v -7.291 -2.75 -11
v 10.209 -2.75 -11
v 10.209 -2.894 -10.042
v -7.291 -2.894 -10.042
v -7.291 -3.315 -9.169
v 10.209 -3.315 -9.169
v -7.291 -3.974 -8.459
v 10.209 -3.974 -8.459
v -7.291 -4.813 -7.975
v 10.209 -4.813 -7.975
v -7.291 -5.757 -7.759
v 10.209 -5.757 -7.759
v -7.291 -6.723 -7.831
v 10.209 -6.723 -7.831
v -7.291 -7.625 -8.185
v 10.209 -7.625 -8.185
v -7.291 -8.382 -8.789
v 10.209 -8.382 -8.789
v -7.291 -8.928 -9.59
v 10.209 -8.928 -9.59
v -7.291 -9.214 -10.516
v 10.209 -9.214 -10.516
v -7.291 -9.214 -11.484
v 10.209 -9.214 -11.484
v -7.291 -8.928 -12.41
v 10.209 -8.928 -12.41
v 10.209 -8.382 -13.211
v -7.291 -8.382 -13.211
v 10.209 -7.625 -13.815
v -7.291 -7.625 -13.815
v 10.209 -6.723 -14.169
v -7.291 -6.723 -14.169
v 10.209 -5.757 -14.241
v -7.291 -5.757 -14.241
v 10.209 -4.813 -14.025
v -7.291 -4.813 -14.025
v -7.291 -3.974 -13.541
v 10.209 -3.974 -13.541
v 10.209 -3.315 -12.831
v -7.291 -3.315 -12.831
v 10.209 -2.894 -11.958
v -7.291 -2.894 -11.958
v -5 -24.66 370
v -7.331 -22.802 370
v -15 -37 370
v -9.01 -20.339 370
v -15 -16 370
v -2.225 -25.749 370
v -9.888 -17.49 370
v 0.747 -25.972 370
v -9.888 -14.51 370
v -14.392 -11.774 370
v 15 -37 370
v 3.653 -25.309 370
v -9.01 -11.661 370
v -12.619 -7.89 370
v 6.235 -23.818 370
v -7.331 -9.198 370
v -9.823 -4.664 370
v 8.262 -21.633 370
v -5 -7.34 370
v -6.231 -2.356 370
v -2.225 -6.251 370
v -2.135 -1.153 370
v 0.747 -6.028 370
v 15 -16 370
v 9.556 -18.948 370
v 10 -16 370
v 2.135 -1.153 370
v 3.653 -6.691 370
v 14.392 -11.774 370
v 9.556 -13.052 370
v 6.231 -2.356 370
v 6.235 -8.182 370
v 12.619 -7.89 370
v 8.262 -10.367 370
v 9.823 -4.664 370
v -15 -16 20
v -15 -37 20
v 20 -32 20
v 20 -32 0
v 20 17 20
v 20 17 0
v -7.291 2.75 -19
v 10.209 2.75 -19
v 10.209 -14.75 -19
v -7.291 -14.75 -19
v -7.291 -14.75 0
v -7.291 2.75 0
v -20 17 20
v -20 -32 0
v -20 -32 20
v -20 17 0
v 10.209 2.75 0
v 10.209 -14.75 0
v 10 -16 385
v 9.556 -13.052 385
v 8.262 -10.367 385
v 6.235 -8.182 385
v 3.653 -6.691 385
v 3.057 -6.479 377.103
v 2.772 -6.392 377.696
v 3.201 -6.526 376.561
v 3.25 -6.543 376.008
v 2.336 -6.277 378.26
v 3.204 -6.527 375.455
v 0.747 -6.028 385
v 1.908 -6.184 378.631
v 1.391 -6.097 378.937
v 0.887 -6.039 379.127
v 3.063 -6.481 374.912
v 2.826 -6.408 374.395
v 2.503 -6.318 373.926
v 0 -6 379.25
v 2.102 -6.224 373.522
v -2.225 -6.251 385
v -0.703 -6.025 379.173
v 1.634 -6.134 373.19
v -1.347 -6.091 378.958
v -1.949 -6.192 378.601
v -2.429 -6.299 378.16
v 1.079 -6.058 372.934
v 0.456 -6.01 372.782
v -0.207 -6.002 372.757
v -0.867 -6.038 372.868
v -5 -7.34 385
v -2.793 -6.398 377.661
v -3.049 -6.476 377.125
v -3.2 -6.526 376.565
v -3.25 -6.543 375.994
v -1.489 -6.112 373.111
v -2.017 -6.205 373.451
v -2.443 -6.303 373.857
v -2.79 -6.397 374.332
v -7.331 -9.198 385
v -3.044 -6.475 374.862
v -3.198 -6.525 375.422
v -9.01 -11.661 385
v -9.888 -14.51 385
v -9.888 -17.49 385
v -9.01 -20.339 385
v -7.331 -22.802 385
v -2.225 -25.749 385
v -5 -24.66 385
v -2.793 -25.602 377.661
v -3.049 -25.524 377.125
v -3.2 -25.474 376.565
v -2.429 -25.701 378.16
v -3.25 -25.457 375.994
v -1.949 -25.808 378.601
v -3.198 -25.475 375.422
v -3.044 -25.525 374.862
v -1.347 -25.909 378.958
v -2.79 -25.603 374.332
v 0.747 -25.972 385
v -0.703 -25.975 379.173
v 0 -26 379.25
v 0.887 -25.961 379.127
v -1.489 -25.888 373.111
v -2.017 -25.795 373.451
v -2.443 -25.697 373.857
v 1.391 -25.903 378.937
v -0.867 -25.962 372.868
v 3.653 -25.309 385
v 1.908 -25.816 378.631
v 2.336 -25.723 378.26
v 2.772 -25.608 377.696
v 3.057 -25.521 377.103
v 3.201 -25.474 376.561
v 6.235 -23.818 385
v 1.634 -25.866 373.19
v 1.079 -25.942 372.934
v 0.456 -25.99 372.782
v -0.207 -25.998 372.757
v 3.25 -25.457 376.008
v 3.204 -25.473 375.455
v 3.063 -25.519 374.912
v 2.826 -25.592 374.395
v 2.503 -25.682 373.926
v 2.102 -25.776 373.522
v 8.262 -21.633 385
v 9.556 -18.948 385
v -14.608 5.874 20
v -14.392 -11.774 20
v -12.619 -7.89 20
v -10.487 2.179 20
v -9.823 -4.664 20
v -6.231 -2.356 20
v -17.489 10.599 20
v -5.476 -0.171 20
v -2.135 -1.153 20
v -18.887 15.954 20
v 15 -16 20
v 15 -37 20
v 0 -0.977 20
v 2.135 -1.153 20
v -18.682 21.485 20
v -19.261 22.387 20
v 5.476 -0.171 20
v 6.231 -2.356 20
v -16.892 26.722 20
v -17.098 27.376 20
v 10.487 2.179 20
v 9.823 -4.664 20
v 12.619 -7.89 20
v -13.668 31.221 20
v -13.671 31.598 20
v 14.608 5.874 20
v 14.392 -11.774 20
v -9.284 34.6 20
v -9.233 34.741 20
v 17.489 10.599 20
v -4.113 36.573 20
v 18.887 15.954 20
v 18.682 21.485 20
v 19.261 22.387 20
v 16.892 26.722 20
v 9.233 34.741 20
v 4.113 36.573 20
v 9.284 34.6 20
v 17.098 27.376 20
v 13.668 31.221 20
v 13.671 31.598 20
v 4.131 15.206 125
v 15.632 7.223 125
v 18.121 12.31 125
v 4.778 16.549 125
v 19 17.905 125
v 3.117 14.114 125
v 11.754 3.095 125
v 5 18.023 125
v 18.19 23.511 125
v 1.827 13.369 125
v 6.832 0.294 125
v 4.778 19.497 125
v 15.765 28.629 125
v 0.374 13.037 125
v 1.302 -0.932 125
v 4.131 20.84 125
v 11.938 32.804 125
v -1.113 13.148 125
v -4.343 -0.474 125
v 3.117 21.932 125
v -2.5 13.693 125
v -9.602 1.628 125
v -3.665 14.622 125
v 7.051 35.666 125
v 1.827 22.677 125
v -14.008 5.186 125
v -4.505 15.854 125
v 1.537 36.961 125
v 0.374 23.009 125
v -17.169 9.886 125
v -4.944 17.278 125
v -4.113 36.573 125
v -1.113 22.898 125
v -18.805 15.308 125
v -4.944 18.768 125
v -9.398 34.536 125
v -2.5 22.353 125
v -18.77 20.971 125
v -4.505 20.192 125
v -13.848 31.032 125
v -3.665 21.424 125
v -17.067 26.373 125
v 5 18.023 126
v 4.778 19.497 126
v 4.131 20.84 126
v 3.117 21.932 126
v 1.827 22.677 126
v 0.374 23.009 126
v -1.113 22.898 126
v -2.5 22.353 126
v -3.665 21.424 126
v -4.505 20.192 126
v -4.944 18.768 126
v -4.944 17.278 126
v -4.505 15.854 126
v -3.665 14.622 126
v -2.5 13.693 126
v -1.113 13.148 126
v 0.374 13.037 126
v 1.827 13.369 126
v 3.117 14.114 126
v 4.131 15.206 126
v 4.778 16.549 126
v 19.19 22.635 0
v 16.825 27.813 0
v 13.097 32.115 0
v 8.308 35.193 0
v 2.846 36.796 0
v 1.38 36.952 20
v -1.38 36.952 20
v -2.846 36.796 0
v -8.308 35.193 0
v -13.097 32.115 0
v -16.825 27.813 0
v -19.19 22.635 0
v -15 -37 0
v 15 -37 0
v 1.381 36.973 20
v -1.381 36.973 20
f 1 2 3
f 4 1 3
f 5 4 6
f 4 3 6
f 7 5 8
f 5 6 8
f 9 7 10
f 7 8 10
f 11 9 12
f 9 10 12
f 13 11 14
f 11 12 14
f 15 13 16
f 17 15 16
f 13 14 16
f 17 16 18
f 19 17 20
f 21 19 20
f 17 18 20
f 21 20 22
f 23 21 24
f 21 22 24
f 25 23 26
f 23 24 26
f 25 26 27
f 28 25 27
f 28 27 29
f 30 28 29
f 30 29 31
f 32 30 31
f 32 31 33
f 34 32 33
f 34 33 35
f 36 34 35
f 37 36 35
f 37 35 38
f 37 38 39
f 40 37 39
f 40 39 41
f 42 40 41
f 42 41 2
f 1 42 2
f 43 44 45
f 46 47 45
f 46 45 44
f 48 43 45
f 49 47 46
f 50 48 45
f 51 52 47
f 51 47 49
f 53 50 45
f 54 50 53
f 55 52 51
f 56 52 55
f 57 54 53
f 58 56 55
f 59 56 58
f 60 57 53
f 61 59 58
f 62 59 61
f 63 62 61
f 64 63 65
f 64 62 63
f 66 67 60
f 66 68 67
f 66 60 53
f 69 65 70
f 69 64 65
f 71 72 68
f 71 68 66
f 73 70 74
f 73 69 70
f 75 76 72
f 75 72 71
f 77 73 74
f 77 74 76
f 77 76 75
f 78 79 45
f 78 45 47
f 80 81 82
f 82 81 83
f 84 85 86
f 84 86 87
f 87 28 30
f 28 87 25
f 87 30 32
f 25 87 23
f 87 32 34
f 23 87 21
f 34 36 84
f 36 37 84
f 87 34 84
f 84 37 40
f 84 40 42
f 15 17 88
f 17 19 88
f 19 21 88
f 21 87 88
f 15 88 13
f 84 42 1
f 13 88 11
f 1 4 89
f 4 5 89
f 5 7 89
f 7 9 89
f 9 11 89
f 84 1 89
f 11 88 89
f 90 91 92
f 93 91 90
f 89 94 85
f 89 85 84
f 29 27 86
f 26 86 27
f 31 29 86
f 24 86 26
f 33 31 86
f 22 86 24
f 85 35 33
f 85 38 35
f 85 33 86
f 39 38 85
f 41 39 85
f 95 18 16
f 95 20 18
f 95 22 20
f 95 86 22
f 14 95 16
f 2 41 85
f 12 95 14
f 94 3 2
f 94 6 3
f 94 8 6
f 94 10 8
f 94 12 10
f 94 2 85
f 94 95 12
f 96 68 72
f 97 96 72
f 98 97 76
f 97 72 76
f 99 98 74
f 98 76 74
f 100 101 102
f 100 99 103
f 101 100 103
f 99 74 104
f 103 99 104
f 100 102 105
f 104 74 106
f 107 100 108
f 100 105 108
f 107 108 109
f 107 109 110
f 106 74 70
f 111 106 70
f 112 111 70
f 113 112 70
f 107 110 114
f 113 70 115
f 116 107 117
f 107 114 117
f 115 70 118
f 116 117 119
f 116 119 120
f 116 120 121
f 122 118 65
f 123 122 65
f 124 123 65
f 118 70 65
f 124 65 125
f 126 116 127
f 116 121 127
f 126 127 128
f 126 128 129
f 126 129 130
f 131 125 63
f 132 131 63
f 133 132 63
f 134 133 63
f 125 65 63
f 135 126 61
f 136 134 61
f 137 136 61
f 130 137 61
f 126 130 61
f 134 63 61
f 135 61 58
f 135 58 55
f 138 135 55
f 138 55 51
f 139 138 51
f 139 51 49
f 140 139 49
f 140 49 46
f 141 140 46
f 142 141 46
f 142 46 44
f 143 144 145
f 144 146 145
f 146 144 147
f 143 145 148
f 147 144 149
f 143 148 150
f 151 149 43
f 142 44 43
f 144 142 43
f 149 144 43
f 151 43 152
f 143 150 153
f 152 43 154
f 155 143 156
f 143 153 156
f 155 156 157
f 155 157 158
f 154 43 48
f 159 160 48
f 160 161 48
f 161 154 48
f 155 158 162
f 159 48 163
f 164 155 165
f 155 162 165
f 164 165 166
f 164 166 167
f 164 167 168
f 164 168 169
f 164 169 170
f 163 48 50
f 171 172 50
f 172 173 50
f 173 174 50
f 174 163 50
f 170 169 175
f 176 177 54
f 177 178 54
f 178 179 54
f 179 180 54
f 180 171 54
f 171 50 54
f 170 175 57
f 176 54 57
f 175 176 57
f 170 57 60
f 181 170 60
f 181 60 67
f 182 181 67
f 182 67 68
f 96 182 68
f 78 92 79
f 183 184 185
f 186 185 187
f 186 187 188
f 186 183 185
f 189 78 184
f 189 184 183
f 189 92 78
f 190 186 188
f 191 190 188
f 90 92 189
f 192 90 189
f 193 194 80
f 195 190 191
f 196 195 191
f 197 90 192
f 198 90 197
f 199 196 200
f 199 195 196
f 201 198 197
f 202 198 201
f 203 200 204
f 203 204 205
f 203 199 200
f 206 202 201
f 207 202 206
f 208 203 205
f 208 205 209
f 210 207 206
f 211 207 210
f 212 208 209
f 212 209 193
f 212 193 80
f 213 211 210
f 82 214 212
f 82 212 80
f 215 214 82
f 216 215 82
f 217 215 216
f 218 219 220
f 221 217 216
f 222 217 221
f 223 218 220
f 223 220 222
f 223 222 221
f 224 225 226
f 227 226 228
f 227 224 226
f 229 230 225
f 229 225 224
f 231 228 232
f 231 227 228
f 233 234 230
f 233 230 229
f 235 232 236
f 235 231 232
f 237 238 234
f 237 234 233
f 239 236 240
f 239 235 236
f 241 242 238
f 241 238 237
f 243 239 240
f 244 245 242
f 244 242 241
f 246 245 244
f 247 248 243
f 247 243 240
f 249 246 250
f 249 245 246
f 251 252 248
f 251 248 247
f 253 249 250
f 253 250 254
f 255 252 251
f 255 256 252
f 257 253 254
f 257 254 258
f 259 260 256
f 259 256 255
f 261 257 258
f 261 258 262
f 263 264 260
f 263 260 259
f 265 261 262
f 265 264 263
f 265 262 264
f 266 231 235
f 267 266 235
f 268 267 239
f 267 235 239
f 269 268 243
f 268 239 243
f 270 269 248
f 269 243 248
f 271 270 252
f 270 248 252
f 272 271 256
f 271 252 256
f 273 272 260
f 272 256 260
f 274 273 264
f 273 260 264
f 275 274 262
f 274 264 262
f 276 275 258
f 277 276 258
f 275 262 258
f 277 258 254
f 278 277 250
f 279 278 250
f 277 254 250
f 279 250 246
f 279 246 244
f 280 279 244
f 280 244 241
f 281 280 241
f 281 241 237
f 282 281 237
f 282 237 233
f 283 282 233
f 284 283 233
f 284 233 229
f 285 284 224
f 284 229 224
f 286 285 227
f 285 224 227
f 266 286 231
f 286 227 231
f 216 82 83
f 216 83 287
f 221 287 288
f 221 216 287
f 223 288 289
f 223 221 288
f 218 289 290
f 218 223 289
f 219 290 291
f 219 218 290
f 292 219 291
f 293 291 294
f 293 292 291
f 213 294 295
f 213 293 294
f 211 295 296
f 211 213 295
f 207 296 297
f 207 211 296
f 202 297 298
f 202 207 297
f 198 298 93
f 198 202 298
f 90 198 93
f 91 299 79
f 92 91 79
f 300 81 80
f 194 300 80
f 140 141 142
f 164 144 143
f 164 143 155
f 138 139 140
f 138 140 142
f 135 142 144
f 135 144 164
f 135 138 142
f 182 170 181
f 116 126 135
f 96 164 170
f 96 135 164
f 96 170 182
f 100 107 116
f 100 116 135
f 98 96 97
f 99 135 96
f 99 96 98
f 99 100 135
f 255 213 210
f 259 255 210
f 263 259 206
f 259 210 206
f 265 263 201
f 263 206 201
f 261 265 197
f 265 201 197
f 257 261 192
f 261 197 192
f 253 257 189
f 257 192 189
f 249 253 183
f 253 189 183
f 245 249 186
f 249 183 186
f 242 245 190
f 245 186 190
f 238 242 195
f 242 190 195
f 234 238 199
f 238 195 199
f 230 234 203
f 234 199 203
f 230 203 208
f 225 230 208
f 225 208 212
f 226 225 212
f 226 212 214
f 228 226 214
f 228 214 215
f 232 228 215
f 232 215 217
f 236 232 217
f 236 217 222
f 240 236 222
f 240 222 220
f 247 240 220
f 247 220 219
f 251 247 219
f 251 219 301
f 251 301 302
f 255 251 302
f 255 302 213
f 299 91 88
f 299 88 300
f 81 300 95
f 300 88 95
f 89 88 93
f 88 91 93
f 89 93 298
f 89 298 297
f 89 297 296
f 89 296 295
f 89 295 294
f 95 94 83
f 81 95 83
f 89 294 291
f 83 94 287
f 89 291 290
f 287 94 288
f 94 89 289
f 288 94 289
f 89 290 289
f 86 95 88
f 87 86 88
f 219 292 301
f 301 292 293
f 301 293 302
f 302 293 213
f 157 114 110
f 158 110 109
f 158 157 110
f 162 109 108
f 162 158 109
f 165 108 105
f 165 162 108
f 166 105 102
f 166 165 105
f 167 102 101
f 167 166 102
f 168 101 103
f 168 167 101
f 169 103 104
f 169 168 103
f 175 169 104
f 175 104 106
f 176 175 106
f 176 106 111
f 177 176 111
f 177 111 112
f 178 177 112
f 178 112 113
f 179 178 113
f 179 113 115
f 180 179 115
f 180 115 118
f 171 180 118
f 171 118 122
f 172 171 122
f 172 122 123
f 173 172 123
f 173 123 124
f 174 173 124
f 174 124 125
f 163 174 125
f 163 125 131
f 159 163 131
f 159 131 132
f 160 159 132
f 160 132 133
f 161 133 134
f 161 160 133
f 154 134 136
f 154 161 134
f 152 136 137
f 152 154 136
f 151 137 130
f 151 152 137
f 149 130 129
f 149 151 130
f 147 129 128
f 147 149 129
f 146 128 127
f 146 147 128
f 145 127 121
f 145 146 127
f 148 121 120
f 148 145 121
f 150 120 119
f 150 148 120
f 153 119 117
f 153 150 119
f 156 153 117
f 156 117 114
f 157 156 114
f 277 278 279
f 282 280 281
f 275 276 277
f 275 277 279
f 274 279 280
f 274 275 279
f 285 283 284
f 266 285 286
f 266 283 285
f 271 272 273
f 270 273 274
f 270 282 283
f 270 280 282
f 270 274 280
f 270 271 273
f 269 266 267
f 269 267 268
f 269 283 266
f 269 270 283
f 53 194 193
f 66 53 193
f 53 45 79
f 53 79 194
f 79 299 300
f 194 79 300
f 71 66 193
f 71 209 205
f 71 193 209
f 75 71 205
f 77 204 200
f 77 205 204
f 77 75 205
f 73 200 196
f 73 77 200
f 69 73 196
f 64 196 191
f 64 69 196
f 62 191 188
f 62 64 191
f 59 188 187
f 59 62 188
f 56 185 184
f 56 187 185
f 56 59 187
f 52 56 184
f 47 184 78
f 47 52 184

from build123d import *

# Parameters (mm, degrees)
SKETCH1_W               = 40
SKETCH1_H               = 74
BOSS_EXTRUDE1_DEPTH     = 20
FILLET1_RADIUS          = 20
FILLET1_LENGTH          = 20
CHAMFER1_SIZE           = 5
CHAMFER2_SIZE           = 5
SKETCH2_R               = 19
BOSS_EXTRUDE2_DEPTH     = 105
SKETCH3_R               = 5
BOSS_EXTRUDE3_DEPTH     = 1
SKETCH5_W               = 30
SKETCH5_H               = 36
BOSS_EXTRUDE4_DEPTH     = 350
FILLET2_RADIUS          = 15
FILLET2_LENGTH          = 350
SKETCH6_R               = 10
BOSS_EXTRUDE5_DEPTH     = 15
CUT_EXTRUDE1_DEPTH      = 391.476447911
CUT_EXTRUDE1_DEPTH_BACK = 391.476447911
SKETCH8_R               = 3.25
SKETCH9_W               = 17.5
SKETCH9_H               = 17.5
BOSS_EXTRUDE6_DEPTH     = 19
SKETCH11_R              = 3.25
CUT_EXTRUDE3_DEPTH      = 388.953947021


with BuildPart() as part:
    # Sketch1 → Boss-Extrude1 (new body)
    with BuildSketch(Plane.XY):
        Rectangle(SKETCH1_W, SKETCH1_H)
    extrude(amount=BOSS_EXTRUDE1_DEPTH)

    # Fillet1: full round fillet: the end face becomes a half cylinder, R = half its width
    fillet1_face = Plane((0, 37, 10), x_dir=(0, 0, 1), z_dir=(0, 1, 0))  # on the end face: x along it, z out of the body
    fillet1_slab = fillet1_face.offset(-FILLET1_RADIUS / 2) * Box(FILLET1_LENGTH, 2 * FILLET1_RADIUS, FILLET1_RADIUS, mode=Mode.PRIVATE)  # the body's end, R deep
    fillet1_round = Plane((0, 17, 10), x_dir=(0, 1, 0), z_dir=(0, 0, 1)) * Cylinder(FILLET1_RADIUS, FILLET1_LENGTH, mode=Mode.PRIVATE)  # its axis R under the face
    add(fillet1_slab - fillet1_round, mode=Mode.SUBTRACT)

    # Chamfer1
    chamfer1_edges = [part.edges().sort_by_distance(p)[0] for p in [
        (-20, -37, 10),
    ]]
    chamfer(chamfer1_edges, length=CHAMFER1_SIZE)

    # Chamfer2
    chamfer2_edges = [part.edges().sort_by_distance(p)[0] for p in [
        (20, -37, 10),
    ]]
    chamfer(chamfer2_edges, length=CHAMFER2_SIZE)

    # Sketch2 → Boss-Extrude2 (add)
    with BuildSketch(Plane.XY.offset(20)):
        with Locations(Location((0, 18.023030993, 0), (0, 0, 102.501860176))):
            Circle(SKETCH2_R)
    extrude(amount=BOSS_EXTRUDE2_DEPTH)

    # Sketch3 → Boss-Extrude3 (add)
    with BuildSketch(Plane.XY.offset(125)):
        with Locations((0, 18.023030993)):
            Circle(SKETCH3_R)
    extrude(amount=BOSS_EXTRUDE3_DEPTH)

    # Sketch5 → Boss-Extrude4 (add)
    with BuildSketch(Plane.XY.offset(20)):
        with Locations((0, -19)):
            Rectangle(SKETCH5_W, SKETCH5_H)
    extrude(amount=BOSS_EXTRUDE4_DEPTH)

    # Fillet2: full round fillet: the end face becomes a half cylinder, R = half its width
    fillet2_face = Plane((0, -1, 195), x_dir=(0, 0, 1), z_dir=(0, 1, 0))  # on the end face: x along it, z out of the body
    fillet2_slab = fillet2_face.offset(-FILLET2_RADIUS / 2) * Box(FILLET2_LENGTH, 2 * FILLET2_RADIUS, FILLET2_RADIUS, mode=Mode.PRIVATE)  # the body's end, R deep
    fillet2_round = Plane((0, -16, 195), x_dir=(0, 1, 0), z_dir=(0, 0, 1)) * Cylinder(FILLET2_RADIUS, FILLET2_LENGTH, mode=Mode.PRIVATE)  # its axis R under the face
    add(fillet2_slab - fillet2_round, mode=Mode.SUBTRACT)

    # Sketch6 → Boss-Extrude5 (add)
    with BuildSketch(Plane.XY.offset(370)):
        with Locations((0, -16)):
            Circle(SKETCH6_R)
    extrude(amount=BOSS_EXTRUDE5_DEPTH)

    # Sketch8 → Cut-Extrude1 (cut, two sides: drawn at the far end of the back side and taken through both)
    with BuildSketch(Plane(origin=(0, -25, 0), x_dir=(1, 0, 0), z_dir=(0, 1, 0)).offset(-CUT_EXTRUDE1_DEPTH_BACK)):
        with Locations(Location((0, -376, 0), (0, 0, 270))):
            Circle(SKETCH8_R)
    extrude(amount=CUT_EXTRUDE1_DEPTH + CUT_EXTRUDE1_DEPTH_BACK, mode=Mode.SUBTRACT)

    # Sketch9 → Boss-Extrude6 (add)
    with BuildSketch(Plane(origin=(0, 0, 0), x_dir=(-1, 0, 0), z_dir=(0, 0, -1))):
        with Locations((-1.458609833, -6)):
            Rectangle(SKETCH9_W, SKETCH9_H)
    extrude(amount=BOSS_EXTRUDE6_DEPTH)

    # Sketch11 → Cut-Extrude3 (cut, through all)
    with BuildSketch(Plane(origin=(10.208609833, 0, 0), x_dir=(0, 0, -1), z_dir=(1, 0, 0))):
        with Locations(Location((11, -6, 0), (0, 0, 90))):
            Circle(SKETCH11_R)
    extrude(amount=-CUT_EXTRUDE3_DEPTH, mode=Mode.SUBTRACT)


solid = part.part
